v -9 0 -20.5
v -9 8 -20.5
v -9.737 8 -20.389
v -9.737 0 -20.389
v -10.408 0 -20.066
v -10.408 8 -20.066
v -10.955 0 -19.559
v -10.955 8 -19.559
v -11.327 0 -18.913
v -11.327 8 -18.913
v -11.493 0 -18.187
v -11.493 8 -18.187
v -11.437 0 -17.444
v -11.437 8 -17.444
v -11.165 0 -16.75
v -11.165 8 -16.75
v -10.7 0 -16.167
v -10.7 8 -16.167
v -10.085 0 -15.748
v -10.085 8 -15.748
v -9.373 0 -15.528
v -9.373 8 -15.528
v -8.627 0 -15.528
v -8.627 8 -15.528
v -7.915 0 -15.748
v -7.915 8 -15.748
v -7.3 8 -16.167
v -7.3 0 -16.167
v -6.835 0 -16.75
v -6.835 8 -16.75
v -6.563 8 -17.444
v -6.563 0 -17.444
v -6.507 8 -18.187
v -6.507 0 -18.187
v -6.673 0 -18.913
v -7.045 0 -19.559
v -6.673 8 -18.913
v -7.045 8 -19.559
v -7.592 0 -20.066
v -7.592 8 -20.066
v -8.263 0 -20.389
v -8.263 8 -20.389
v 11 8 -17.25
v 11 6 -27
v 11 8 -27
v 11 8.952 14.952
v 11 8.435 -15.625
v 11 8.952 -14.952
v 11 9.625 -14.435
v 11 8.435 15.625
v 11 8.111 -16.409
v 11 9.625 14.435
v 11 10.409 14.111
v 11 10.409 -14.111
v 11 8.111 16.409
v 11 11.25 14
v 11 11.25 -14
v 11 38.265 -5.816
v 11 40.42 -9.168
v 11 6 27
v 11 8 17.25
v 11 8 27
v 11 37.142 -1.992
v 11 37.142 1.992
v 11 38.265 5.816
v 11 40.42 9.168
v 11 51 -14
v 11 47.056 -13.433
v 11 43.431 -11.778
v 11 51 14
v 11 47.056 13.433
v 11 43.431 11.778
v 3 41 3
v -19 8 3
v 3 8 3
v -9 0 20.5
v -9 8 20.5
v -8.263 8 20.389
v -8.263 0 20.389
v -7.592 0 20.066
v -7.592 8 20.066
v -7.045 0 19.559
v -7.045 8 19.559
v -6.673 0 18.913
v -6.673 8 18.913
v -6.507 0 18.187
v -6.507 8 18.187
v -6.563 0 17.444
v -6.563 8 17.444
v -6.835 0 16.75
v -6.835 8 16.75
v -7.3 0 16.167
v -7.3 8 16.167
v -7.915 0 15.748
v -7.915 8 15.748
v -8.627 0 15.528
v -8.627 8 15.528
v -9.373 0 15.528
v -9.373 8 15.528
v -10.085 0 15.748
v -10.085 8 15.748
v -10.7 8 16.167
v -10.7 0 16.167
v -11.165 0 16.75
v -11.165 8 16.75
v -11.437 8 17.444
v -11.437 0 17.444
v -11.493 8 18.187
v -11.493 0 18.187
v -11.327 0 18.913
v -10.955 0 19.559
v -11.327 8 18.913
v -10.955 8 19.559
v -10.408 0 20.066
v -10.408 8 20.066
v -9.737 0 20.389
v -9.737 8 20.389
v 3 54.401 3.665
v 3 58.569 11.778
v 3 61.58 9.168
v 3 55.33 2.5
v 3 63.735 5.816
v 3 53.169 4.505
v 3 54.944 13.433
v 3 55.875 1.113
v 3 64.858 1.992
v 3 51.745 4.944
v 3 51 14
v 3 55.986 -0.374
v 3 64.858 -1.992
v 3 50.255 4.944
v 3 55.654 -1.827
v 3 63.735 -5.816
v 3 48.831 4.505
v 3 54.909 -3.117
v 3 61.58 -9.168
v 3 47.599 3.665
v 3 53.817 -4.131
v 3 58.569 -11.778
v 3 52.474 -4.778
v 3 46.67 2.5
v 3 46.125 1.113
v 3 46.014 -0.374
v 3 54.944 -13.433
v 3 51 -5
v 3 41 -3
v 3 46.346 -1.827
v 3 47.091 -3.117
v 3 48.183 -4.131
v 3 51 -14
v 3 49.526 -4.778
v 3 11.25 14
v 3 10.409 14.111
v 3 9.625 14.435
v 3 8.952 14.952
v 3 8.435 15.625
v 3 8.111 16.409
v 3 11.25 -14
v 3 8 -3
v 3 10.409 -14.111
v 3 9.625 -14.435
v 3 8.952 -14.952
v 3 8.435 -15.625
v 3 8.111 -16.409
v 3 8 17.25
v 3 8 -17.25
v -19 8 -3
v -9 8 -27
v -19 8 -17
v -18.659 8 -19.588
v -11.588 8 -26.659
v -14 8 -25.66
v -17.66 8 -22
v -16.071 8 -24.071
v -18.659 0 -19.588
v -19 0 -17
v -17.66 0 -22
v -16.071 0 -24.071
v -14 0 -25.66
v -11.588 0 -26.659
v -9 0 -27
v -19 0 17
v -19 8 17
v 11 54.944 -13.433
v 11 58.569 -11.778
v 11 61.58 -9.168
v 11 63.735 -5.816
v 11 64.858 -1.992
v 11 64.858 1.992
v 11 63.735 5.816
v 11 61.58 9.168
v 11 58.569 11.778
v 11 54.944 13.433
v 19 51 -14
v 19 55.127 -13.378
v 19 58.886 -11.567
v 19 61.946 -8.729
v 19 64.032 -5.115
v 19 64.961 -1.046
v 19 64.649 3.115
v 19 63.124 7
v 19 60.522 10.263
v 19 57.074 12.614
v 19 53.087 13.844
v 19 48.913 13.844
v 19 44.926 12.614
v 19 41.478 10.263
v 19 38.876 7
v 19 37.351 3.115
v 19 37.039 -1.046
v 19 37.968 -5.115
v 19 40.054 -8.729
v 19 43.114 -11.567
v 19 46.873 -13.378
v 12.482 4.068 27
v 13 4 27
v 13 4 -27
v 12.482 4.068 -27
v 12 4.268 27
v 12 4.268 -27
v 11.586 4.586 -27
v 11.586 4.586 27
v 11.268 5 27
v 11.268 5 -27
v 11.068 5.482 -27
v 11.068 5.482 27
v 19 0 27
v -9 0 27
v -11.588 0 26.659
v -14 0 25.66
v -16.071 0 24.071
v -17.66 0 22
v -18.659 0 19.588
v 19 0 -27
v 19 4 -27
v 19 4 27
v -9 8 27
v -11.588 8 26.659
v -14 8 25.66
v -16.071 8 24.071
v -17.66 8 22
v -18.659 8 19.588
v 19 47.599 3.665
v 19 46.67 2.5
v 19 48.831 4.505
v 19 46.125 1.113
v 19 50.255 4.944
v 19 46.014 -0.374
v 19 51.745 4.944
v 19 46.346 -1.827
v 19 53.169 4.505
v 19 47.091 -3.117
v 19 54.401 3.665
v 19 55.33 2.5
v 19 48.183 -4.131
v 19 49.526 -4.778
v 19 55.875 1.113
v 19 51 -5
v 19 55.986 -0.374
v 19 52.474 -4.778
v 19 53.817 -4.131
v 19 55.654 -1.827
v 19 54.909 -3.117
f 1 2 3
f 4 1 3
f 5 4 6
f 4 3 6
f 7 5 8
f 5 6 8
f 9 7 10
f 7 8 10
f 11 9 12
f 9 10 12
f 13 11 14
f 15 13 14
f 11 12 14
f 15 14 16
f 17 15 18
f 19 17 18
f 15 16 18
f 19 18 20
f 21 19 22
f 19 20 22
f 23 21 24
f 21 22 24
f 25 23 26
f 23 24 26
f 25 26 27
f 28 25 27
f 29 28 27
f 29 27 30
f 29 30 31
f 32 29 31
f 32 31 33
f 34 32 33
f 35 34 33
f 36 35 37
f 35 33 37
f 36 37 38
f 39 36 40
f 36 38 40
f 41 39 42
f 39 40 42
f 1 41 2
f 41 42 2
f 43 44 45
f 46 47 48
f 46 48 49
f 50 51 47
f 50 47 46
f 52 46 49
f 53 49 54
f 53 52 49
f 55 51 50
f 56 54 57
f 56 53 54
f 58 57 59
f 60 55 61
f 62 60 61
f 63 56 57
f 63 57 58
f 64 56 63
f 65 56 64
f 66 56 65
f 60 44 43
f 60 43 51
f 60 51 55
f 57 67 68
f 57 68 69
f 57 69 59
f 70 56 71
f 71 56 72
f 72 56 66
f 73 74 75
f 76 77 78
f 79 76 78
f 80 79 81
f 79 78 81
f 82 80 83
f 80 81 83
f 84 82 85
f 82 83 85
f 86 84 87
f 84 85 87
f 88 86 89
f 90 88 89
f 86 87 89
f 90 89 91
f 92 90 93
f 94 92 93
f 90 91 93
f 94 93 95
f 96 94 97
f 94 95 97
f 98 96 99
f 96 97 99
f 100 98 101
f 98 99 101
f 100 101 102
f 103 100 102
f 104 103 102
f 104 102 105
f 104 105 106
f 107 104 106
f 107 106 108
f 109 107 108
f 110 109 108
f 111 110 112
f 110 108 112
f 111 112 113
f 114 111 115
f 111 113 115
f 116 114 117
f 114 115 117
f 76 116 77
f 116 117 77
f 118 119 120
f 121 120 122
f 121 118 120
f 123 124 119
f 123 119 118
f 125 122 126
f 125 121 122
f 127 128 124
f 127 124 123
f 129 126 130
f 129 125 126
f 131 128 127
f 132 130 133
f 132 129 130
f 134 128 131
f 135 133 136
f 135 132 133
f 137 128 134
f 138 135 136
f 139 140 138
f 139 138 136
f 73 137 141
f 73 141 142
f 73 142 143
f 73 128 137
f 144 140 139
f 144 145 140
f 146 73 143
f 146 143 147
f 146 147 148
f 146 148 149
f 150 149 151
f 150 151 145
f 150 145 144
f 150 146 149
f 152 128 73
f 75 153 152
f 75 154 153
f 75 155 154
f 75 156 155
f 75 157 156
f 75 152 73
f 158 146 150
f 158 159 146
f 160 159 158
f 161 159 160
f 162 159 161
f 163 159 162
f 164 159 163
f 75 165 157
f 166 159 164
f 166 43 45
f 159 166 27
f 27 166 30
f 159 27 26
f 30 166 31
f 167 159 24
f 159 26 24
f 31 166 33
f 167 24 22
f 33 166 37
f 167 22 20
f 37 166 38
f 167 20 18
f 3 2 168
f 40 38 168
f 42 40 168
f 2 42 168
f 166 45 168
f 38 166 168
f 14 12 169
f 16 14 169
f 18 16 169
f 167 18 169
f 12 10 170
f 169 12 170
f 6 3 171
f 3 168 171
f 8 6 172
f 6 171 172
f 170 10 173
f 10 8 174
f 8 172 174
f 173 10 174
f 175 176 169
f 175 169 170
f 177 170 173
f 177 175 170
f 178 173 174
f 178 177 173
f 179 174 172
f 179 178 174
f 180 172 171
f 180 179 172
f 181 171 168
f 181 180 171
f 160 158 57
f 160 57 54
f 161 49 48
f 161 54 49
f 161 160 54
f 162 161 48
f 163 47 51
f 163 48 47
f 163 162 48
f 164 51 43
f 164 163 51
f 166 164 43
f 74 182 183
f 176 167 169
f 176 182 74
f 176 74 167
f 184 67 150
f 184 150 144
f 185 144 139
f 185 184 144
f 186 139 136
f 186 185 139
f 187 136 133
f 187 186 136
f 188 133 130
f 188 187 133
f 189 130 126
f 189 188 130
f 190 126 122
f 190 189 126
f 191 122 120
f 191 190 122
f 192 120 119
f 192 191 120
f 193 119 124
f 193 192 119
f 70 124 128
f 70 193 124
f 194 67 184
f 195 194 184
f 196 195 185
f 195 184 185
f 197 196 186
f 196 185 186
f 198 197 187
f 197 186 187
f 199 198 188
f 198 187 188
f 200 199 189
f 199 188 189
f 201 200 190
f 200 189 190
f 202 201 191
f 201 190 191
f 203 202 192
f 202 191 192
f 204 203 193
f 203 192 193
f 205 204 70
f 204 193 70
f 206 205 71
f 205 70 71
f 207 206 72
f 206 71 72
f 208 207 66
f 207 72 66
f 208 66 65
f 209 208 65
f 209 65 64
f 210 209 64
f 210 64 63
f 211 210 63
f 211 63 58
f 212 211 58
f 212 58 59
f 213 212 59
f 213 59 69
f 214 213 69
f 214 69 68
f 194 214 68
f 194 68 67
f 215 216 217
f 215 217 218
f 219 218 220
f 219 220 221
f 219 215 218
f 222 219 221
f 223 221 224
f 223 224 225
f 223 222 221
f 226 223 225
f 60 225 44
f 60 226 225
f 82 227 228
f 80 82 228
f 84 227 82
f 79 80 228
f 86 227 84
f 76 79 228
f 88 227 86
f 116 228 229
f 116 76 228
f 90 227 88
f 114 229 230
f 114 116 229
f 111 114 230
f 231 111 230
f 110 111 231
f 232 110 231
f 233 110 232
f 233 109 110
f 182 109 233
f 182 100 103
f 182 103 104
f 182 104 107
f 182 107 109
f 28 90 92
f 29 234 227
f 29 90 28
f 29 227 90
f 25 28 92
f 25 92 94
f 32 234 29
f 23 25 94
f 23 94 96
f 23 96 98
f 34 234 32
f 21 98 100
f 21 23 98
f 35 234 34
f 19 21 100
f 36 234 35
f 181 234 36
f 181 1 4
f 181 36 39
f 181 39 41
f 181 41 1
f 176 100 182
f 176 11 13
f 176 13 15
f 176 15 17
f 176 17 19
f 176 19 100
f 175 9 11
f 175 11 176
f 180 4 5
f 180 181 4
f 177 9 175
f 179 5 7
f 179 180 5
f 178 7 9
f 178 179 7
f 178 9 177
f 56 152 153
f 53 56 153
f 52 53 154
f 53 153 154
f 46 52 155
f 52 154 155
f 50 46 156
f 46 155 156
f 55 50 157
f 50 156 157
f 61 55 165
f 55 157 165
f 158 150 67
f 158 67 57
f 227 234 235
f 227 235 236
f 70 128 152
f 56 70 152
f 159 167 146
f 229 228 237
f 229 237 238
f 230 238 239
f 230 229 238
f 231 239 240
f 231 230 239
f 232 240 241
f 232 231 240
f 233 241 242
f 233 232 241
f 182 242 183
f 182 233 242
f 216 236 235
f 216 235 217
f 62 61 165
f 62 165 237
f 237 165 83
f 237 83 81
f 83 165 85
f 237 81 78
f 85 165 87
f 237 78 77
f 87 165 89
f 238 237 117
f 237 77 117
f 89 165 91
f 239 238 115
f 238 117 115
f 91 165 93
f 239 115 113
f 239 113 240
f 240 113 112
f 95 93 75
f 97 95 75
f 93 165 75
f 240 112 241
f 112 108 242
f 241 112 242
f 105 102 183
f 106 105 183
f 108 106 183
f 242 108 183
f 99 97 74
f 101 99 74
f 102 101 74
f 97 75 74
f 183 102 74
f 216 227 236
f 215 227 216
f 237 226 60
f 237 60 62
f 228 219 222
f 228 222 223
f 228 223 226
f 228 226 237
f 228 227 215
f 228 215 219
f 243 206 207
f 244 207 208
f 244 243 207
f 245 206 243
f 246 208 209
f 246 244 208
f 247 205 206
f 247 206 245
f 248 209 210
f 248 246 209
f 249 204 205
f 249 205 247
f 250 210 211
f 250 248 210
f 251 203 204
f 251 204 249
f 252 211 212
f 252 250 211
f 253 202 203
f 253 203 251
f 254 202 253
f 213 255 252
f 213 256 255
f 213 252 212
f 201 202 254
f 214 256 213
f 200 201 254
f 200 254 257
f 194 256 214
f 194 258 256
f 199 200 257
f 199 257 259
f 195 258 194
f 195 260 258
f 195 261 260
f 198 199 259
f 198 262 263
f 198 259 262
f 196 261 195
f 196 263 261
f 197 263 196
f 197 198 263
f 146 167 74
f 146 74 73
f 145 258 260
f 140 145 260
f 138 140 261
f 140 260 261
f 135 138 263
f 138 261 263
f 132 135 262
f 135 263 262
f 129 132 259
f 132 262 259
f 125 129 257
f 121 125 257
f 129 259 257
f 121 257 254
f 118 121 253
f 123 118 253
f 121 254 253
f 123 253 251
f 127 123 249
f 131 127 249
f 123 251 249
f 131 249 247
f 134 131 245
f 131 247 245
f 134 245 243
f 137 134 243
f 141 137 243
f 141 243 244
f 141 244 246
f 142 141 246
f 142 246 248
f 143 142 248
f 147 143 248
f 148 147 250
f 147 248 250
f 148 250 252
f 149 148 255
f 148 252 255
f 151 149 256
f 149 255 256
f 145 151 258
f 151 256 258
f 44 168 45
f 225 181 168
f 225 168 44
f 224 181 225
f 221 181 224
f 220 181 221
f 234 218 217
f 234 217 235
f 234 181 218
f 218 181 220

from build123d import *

# Parameters (mm, degrees)
Y_KSEKLIK_EKSTR_ZYON2_DEPTH      = 8
IZIM4_R                          = 2.5
KES_EKSTR_ZYON1_DEPTH            = 8
KES_EKSTR_ZYON2_DEPTH            = 54
IZIM13_W                         = 8
IZIM13_H                         = 41
Y_KSEKLIK_EKSTR_ZYON8_DEPTH      = 43
KES_EKSTR_ZYON7_DEPTH            = 43
IZIM15_R                         = 14
Y_KSEKLIK_EKSTR_ZYON9_DEPTH      = 8
Y_KSEKLIK_EKSTR_ZYON9_DEPTH_BACK = 8
IZIM16_R                         = 5
KES_EKSTR_ZYON8_DEPTH            = 16
FEDER12_REACH                    = 74.904
IZIM17_WALL_W                    = 187.469157084
IZIM17_WALL_H                    = 6


with BuildPart() as part:
    # Çizim3 → Yükseklik-Ekstrüzyon2 (new body)
    with BuildSketch(Plane(origin=(0, 0, 0), x_dir=(1, 0, 0), z_dir=(0, 1, 0))):
        with BuildLine():
            Line((-19, -17), (-19, 17))
            ThreePointArc((-19, 17), (-16.071067812, 24.071067812), (-9, 27))
            Line((-9, 27), (19, 27))
            Line((19, 27), (19, -27))
            Line((19, -27), (-9, -27))
            ThreePointArc((-9, -27), (-16.071067812, -24.071067812), (-19, -17))
        make_face()
    extrude(amount=Y_KSEKLIK_EKSTR_ZYON2_DEPTH)

    # Çizim4 → Kes-Ekstrüzyon1 (cut)
    with BuildSketch(Plane(origin=(0, 8, 0), x_dir=(1, 0, 0), z_dir=(0, 1, 0))):
        with Locations(Location((-9, -18, 0), (0, 0, 270))):
            Circle(IZIM4_R)
        with Locations(Location((-9, 18, 0), (0, 0, 90))):
            Circle(IZIM4_R)
    extrude(amount=-KES_EKSTR_ZYON1_DEPTH, mode=Mode.SUBTRACT)

    # Çizim5 → Kes-Ekstrüzyon2 (cut)
    with BuildSketch(Plane.XY.offset(27)):
        with BuildLine():
            Line((11, 8), (19, 8))
            Line((19, 8), (19, 4))
            Line((19, 4), (13, 4))
            ThreePointArc((13, 4), (11.585786438, 4.585786438), (11, 6))
            Line((11, 6), (11, 8))
        make_face()
    extrude(amount=-KES_EKSTR_ZYON2_DEPTH, mode=Mode.SUBTRACT)

    # Çizim13 → Yükseklik-Ekstrüzyon8 (add)
    with BuildSketch(Plane(origin=(0, 8, 0), x_dir=(1, 0, 0), z_dir=(0, 1, 0))):
        with Locations((7, 0)):
            Rectangle(IZIM13_W, IZIM13_H)
    extrude(amount=Y_KSEKLIK_EKSTR_ZYON8_DEPTH)

    # Çizim14 → Kes-Ekstrüzyon7 (cut)
    with BuildSketch(Plane.ZY.offset(-3)):
        with BuildLine():
            Line((20.5, 8), (20.5, 51))
            Line((20.5, 51), (14, 51))
            Line((14, 51), (14, 11.25))
            ThreePointArc((14, 11.25), (14.951902961, 8.951902961), (17.25, 8))
            Line((17.25, 8), (20.5, 8))
        make_face()
        with BuildLine():
            Line((-20.5, 51), (-14, 51))
            Line((-14, 51), (-14, 11.25))
            ThreePointArc((-14, 11.25), (-14.951902961, 8.951902961), (-17.25, 8))
            Line((-17.25, 8), (-20.5, 8))
            Line((-20.5, 8), (-20.5, 51))
        make_face()
    extrude(amount=-KES_EKSTR_ZYON7_DEPTH, mode=Mode.SUBTRACT)

    # Çizim15 → Yükseklik-Ekstrüzyon9 (add, two sides)
    with BuildSketch(Plane(origin=(11, 0, 0), x_dir=(0, 0, -1), z_dir=(1, 0, 0))) as y_kseklik_ekstr_zyon9_sk:
        with Locations((0, 51)):
            Circle(IZIM15_R)
    extrude(amount=Y_KSEKLIK_EKSTR_ZYON9_DEPTH)
    extrude(y_kseklik_ekstr_zyon9_sk.sketch, amount=-Y_KSEKLIK_EKSTR_ZYON9_DEPTH_BACK)

    # Çizim16 → Kes-Ekstrüzyon8 (cut)
    with BuildSketch(Plane(origin=(19, 0, 0), x_dir=(0, 0, -1), z_dir=(1, 0, 0))):
        with Locations((0, 51)):
            Circle(IZIM16_R)
    extrude(amount=-KES_EKSTR_ZYON8_DEPTH, mode=Mode.SUBTRACT)

    # Çizim17 wall → Feder12 (add, up to next)
    with BuildSketch(Plane(origin=(-8, 24.5, 0), x_dir=(0.554700196225, 0.832050294338, 0), z_dir=(-0.832050294338, 0.554700196225, 0)), mode=Mode.PRIVATE) as feder12_sk1:
        Rectangle(IZIM17_WALL_W, IZIM17_WALL_H)
    feder12_tool1 = extrude(feder12_sk1.sketch, amount=-FEDER12_REACH, mode=Mode.PRIVATE) - part.part
    add(feder12_tool1.solids().sort_by_distance((-8, 24.5, 0))[0])


solid = part.part
